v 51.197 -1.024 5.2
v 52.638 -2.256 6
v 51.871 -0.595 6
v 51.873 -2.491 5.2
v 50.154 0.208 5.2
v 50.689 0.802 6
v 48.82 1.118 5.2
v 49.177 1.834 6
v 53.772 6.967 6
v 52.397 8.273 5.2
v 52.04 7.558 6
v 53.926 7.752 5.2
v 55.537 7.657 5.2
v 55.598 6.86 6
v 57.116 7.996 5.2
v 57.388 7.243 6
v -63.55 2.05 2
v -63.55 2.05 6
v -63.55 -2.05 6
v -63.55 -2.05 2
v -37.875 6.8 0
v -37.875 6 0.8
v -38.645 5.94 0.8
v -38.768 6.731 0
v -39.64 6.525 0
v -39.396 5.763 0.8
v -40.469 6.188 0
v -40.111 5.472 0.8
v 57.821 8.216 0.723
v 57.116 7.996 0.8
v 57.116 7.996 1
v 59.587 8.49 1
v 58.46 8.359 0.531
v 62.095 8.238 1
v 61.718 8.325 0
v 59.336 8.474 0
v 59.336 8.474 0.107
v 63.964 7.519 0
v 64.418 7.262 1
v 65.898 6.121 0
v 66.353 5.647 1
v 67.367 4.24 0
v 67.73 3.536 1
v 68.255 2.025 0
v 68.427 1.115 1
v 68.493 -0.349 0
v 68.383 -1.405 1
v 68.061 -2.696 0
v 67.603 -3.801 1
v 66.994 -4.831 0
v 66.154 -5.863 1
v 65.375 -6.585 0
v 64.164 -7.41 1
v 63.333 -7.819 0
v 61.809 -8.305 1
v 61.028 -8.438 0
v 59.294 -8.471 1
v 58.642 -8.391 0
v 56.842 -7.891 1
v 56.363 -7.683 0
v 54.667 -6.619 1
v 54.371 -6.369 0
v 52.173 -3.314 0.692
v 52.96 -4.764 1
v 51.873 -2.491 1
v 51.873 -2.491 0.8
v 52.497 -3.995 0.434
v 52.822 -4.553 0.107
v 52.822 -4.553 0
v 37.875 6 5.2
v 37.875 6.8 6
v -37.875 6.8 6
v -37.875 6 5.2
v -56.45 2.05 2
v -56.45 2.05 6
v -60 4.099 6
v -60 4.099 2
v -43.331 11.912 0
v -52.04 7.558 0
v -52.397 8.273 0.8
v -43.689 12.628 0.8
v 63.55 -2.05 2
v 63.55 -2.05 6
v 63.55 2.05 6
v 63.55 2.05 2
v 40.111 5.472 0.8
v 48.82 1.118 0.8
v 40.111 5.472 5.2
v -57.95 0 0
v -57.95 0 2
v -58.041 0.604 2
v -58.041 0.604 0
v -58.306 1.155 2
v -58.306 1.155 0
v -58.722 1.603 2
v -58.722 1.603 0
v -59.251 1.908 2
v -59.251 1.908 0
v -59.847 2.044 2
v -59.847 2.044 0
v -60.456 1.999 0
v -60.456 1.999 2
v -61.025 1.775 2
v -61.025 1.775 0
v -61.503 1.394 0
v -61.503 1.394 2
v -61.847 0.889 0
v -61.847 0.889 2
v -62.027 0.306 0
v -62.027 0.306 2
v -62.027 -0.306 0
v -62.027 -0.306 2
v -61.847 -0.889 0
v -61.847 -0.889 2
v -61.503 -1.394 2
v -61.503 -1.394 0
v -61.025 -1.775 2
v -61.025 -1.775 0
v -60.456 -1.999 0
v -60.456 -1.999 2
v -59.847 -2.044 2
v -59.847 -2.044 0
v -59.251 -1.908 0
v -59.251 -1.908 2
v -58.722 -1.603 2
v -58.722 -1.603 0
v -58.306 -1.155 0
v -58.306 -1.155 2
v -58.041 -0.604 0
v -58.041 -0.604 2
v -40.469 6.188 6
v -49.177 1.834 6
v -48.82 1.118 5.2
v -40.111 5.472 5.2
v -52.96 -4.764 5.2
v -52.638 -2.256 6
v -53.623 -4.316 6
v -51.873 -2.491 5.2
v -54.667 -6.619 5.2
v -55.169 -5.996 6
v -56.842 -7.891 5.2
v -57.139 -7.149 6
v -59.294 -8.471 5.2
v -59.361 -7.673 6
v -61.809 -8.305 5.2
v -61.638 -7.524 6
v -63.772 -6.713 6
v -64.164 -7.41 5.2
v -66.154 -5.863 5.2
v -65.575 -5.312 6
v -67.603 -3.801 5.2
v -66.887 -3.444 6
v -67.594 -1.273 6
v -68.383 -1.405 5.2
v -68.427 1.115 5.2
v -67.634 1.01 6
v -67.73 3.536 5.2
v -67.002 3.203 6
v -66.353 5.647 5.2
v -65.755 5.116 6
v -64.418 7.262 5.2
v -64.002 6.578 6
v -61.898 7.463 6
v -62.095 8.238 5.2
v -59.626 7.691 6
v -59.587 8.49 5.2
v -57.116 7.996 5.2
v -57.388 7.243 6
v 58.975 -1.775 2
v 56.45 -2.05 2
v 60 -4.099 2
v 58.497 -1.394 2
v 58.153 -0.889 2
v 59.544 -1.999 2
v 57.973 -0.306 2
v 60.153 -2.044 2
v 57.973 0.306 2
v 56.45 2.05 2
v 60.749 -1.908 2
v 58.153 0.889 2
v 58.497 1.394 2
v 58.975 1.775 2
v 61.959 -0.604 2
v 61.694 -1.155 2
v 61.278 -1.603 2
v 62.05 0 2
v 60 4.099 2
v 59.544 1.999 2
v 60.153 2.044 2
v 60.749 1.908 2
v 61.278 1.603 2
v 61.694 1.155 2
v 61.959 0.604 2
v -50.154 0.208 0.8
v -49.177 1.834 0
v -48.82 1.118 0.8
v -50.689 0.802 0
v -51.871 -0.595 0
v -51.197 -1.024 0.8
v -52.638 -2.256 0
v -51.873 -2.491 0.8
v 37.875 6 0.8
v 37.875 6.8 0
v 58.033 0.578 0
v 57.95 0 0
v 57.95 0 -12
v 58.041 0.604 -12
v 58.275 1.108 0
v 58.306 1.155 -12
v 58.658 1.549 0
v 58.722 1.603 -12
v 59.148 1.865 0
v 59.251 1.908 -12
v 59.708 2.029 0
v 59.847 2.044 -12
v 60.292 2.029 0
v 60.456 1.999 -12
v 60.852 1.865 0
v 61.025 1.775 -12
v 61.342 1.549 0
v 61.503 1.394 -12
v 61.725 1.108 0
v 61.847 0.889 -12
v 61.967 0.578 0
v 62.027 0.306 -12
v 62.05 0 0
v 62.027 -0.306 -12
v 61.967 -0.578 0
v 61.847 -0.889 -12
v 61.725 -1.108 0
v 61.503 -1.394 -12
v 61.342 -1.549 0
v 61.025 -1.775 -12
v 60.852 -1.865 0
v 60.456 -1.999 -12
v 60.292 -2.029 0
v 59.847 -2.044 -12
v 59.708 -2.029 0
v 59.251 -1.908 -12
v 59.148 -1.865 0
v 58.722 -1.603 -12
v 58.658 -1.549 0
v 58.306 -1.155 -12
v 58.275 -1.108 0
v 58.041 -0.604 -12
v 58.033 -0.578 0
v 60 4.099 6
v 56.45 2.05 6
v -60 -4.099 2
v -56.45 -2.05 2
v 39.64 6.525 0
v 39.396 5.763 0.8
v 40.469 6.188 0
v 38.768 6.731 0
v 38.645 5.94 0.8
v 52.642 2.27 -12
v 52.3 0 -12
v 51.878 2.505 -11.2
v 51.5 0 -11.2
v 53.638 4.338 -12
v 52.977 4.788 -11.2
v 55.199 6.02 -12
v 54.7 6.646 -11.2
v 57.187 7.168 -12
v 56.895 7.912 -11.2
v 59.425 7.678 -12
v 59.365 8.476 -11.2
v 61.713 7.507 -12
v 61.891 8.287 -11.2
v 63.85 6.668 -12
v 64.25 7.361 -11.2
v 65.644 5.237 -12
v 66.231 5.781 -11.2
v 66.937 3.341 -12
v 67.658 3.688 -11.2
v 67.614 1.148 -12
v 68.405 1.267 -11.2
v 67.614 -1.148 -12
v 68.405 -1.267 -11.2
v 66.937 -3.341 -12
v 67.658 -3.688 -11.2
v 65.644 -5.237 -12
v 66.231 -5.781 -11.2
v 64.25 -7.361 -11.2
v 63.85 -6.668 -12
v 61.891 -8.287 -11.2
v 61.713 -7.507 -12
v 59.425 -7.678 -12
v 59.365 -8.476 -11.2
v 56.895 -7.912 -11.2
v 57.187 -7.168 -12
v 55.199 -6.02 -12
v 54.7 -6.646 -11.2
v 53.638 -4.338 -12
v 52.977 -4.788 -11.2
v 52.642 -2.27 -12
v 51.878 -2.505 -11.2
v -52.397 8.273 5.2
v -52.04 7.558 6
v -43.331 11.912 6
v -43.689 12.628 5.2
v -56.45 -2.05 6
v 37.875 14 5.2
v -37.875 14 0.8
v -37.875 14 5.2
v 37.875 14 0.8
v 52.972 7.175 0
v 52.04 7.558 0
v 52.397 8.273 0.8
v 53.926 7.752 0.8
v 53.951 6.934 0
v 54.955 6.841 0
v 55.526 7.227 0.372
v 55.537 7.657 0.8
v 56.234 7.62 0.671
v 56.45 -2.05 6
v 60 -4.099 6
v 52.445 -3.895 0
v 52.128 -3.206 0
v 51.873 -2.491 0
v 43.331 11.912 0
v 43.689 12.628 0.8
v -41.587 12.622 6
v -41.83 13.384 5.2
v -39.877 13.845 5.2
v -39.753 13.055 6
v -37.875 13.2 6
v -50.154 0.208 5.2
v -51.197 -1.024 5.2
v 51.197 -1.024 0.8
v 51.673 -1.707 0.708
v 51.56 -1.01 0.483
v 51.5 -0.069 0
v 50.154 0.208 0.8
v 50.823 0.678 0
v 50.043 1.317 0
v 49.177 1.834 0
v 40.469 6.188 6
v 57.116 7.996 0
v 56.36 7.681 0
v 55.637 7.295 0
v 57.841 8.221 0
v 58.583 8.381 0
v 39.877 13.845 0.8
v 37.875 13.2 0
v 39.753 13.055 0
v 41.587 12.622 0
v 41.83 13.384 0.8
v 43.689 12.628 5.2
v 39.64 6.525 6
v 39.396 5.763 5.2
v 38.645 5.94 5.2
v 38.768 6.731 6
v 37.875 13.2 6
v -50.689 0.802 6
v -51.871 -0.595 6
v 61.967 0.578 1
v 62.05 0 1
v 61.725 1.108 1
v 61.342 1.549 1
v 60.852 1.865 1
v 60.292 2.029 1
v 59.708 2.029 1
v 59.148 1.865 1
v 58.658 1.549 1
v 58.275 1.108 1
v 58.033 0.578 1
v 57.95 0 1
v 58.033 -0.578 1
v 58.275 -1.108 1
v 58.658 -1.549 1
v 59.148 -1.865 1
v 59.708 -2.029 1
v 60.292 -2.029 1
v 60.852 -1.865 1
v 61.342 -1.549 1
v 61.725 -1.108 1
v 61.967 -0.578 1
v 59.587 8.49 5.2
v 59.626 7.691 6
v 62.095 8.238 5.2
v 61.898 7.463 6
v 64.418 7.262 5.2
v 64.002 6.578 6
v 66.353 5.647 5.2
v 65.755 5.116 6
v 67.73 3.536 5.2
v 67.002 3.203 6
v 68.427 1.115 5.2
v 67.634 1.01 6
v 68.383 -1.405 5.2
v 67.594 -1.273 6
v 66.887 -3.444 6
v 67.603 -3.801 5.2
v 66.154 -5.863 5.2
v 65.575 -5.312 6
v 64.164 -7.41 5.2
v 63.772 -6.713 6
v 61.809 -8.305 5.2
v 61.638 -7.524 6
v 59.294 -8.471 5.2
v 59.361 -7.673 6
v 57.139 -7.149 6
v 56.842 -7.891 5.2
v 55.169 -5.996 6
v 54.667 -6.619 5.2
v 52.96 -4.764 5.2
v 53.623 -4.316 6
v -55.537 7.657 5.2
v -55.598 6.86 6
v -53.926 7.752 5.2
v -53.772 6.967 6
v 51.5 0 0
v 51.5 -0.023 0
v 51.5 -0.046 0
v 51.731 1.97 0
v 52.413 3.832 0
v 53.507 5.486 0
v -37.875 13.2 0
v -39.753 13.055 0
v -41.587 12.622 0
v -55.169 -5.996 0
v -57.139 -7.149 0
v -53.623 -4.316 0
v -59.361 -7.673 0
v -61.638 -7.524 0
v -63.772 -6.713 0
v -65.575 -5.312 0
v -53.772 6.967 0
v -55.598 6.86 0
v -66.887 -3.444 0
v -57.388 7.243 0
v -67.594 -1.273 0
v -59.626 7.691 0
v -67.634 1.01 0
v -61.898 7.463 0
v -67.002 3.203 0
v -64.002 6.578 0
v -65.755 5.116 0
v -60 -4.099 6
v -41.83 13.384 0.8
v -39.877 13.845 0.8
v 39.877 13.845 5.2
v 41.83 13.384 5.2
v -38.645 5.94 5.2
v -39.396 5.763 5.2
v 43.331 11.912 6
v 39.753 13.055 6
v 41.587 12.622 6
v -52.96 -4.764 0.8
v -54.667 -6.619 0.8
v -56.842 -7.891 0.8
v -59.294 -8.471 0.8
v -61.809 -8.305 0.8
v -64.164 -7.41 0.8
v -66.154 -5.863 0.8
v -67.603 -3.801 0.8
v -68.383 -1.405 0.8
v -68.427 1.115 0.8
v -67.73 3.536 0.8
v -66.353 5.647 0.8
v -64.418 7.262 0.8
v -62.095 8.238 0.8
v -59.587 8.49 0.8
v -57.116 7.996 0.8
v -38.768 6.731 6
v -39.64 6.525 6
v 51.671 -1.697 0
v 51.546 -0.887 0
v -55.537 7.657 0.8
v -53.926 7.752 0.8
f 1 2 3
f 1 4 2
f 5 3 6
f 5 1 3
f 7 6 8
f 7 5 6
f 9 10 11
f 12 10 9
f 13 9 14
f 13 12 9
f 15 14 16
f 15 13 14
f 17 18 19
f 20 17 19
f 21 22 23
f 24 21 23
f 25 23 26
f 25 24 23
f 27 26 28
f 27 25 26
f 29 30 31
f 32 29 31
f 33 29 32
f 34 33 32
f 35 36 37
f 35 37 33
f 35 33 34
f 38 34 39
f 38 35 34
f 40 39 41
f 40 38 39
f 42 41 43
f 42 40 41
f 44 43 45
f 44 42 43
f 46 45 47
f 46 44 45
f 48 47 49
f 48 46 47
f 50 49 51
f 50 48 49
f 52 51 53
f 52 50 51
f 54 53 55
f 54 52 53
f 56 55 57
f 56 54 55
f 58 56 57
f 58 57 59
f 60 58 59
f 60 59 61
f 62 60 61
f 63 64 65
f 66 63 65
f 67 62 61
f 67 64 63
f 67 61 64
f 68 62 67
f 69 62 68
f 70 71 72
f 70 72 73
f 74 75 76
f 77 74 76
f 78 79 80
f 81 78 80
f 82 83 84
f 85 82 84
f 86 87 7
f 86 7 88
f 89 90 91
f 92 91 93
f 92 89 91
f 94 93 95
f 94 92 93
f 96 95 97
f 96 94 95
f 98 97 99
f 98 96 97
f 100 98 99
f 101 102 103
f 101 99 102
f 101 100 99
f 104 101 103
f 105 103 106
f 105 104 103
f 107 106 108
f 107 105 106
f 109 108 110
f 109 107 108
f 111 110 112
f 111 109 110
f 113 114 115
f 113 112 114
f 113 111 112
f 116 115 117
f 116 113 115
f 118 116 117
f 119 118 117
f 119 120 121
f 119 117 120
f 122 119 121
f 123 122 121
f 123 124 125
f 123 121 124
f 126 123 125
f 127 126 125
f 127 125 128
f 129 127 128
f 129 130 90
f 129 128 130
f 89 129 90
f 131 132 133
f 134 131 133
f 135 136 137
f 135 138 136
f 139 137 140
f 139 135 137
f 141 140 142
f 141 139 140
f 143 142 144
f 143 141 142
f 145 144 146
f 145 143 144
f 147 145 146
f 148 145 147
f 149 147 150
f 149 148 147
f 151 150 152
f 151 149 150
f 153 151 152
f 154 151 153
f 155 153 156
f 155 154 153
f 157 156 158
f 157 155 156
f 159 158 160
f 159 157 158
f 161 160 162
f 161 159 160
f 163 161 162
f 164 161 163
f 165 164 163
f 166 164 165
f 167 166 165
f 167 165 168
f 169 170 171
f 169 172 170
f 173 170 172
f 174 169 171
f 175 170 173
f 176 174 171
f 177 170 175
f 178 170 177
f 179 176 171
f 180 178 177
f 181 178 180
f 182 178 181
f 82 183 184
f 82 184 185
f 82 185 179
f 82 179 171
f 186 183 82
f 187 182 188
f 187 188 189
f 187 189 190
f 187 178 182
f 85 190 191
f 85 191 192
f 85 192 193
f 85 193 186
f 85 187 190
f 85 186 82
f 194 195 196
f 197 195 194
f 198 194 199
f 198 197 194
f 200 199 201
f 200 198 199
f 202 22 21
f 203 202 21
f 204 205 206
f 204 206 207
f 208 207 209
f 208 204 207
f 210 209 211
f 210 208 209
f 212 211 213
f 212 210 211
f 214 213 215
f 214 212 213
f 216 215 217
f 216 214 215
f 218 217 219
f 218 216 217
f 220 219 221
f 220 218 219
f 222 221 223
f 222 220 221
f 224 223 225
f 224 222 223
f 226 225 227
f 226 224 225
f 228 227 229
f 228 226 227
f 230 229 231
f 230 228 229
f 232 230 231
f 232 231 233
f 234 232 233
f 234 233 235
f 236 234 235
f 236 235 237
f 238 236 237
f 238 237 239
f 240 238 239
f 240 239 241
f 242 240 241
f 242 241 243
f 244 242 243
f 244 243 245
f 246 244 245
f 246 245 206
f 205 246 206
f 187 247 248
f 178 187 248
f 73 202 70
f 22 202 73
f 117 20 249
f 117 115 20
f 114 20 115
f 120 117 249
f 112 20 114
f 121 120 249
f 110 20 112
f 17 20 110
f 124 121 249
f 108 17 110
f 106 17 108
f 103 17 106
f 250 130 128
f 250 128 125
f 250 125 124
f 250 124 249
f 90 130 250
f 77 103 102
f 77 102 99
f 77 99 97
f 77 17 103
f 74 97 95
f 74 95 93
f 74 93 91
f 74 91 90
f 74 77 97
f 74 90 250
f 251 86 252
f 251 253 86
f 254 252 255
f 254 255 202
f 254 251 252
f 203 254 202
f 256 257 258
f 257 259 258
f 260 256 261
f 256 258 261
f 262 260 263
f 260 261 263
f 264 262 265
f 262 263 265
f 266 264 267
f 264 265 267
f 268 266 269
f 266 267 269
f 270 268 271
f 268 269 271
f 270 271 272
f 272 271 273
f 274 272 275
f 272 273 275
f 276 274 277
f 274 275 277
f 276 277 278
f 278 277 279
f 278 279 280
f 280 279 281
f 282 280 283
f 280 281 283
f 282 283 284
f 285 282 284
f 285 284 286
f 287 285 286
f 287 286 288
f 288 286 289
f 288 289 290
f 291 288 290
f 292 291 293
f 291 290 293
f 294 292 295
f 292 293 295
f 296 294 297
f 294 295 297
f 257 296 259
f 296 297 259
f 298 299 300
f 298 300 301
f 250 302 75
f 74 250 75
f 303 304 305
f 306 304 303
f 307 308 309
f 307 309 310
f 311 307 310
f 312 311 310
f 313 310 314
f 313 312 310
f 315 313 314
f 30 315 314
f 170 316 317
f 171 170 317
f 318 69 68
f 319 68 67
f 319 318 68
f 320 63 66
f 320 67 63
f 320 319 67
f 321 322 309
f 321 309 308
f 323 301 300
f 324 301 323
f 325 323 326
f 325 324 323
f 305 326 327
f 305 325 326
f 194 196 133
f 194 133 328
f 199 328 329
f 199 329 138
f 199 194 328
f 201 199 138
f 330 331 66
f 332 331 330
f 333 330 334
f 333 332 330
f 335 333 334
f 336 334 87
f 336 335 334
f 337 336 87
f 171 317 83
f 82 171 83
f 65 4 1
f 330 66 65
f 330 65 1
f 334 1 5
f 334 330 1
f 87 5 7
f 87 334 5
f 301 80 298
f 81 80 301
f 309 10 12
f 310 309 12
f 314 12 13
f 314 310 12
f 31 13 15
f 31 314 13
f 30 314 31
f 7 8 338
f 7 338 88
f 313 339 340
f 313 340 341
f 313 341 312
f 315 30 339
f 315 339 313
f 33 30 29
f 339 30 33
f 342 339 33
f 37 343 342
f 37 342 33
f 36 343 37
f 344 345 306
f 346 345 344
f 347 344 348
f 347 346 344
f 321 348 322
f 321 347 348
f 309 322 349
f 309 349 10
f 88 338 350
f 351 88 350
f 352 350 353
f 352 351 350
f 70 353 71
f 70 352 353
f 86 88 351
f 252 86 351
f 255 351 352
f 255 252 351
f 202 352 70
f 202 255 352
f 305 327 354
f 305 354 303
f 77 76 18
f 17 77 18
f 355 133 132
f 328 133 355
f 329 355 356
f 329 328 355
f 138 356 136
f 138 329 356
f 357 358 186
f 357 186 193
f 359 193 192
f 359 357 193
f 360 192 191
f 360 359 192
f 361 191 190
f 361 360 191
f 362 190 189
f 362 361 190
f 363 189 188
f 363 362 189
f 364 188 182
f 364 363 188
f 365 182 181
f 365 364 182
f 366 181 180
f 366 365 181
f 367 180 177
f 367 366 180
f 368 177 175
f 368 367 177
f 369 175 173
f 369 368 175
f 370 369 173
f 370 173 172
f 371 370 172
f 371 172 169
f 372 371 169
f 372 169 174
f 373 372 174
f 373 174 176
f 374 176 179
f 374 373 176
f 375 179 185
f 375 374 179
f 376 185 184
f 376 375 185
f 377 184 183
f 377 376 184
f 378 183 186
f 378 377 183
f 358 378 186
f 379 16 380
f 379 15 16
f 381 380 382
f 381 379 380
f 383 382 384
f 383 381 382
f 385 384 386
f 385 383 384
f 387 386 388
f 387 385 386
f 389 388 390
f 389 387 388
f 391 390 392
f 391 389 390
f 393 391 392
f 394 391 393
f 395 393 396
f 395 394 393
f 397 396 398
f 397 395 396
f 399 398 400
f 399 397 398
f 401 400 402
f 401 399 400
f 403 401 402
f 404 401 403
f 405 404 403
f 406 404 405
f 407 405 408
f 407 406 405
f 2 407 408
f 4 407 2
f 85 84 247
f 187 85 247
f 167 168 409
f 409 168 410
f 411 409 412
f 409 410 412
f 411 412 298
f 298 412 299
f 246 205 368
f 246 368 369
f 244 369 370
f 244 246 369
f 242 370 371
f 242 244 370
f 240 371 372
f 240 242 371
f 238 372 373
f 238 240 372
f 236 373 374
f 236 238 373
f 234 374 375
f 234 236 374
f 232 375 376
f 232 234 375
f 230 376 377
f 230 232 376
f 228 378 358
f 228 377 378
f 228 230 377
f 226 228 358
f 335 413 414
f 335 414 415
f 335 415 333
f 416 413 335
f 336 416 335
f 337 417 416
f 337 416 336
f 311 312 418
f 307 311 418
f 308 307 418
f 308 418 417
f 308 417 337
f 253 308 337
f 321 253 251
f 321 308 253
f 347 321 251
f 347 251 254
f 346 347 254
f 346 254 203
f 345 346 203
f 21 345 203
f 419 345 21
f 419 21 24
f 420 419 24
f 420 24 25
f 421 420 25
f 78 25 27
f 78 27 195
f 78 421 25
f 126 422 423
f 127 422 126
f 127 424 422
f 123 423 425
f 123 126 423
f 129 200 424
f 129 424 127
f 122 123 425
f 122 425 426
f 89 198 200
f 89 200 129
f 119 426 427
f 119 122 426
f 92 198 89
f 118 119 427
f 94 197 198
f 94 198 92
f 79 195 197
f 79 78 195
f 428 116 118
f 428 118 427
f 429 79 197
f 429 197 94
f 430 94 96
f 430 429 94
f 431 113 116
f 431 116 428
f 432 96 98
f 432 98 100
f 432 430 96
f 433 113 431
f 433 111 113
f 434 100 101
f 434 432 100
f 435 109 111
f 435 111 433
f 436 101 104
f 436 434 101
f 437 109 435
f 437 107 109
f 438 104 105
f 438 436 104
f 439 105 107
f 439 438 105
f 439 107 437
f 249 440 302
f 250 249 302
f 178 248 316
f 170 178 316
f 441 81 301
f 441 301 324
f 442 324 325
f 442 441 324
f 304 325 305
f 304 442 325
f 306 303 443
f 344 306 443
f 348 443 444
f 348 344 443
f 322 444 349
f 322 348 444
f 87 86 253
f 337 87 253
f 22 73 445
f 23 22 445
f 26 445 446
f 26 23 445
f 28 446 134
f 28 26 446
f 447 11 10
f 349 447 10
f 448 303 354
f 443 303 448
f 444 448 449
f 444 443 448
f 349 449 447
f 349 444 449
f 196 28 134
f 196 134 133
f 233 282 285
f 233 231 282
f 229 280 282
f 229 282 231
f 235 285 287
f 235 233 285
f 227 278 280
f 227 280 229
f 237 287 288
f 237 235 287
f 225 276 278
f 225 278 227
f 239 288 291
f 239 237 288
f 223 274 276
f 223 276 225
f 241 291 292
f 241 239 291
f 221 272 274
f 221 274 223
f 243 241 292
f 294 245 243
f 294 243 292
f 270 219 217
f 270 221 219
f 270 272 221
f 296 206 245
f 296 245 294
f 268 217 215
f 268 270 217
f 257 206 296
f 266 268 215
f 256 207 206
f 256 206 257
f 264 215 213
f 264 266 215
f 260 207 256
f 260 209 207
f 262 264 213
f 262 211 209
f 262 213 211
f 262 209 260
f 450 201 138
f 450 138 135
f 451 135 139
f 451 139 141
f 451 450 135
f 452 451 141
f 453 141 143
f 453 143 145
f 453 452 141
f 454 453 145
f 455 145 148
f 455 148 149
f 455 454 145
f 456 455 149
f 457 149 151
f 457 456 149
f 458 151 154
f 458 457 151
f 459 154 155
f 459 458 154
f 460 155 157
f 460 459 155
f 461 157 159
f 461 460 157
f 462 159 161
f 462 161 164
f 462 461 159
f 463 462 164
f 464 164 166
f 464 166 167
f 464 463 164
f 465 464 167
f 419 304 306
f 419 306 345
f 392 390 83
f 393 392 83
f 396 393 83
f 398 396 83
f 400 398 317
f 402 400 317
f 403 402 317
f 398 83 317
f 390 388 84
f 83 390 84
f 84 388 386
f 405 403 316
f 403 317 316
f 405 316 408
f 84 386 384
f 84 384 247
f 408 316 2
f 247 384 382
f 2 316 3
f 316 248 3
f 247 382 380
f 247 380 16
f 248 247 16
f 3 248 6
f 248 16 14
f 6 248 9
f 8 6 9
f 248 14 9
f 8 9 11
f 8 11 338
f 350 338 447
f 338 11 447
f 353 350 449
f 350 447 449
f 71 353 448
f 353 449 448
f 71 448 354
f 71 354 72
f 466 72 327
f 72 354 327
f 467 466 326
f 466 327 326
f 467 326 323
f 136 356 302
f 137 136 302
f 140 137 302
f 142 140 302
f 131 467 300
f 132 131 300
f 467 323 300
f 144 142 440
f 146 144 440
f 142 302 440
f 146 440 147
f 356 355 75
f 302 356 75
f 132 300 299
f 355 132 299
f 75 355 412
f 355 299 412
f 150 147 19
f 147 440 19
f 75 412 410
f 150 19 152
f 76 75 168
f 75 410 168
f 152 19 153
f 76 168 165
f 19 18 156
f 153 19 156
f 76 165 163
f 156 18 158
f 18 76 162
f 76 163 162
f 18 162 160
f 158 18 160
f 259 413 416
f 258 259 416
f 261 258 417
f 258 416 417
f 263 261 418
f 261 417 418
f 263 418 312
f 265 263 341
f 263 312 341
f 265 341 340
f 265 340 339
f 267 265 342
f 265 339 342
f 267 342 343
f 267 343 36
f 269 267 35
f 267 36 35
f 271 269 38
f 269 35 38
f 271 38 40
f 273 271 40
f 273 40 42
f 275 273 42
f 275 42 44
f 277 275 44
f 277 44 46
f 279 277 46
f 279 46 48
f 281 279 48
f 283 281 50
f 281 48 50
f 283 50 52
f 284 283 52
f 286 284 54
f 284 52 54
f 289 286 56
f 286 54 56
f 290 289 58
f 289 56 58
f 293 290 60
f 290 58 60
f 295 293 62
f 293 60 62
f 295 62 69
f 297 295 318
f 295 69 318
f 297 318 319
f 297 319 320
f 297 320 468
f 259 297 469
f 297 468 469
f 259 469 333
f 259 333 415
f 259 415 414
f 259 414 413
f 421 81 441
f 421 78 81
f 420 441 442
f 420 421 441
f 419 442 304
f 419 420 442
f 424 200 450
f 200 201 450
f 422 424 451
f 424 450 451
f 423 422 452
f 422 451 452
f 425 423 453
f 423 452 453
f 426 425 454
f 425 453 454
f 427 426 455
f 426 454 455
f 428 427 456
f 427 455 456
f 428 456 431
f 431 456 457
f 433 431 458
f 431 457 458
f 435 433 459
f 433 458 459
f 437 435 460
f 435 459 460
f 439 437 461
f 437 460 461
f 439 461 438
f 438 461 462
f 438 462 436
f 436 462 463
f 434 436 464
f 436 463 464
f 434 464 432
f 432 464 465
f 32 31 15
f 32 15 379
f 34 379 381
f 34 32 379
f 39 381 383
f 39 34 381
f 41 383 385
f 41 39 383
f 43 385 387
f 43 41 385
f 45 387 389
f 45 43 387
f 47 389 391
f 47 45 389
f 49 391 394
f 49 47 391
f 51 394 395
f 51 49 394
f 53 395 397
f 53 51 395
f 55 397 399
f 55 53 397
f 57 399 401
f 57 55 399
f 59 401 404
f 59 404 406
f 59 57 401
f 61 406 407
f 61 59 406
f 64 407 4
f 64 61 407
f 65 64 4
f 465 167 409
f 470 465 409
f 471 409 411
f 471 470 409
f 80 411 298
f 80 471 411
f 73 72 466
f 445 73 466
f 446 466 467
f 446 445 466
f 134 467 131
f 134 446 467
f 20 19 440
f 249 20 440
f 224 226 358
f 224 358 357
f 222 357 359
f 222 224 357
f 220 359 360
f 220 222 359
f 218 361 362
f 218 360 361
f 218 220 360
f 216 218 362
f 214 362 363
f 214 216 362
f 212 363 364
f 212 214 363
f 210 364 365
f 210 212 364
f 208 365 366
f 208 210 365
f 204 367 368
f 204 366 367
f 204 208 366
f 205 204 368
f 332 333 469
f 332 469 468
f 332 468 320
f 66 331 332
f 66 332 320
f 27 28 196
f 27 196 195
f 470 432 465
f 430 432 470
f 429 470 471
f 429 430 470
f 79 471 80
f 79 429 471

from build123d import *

# Parameters (mm, degrees)
SKETCH1_R                = 2.05
BOSS_EXTRUDE1_DEPTH      = 6
CUT_EXTRUDE1_DEPTH       = 4
BOSS_EXTRUDE2_DEPTH      = 12
BOSS_EXTRUDE2_DEPTH_BACK = 1
SKETCH4_R                = 8.5
SKETCH4_R_2              = 2.05
CHAMFER3_SIZE            = 0.8


with BuildPart() as part:
    # Sketch1 → Boss-Extrude1 (new body)
    with BuildSketch(Plane.XY):
        with BuildLine():
            Line((-52.397368877, 8.273451517), (-43.689164944, 12.627553483))
            ThreePointArc((-43.689164944, 12.627553483), (-40.86217617, 13.652236863), (-37.875388203, 14))
            Line((-37.875388203, 14), (37.875388203, 14))
            ThreePointArc((37.875388203, 14), (40.86217617, 13.652236863), (43.689164944, 12.627553483))
            Line((43.689164944, 12.627553483), (52.397368877, 8.273451517))
            ThreePointArc((52.397368877, 8.273451517), (54.728318318, 7.650368424), (57.116243367, 7.995870664))
            ThreePointArc((57.116243367, 7.995870664), (67.602631123, -3.801315562), (51.873049489, -2.490517092))
            ThreePointArc((51.873049489, -2.490517092), (50.716696252, -0.372875708), (48.819660113, 1.118033989))
            Line((48.819660113, 1.118033989), (40.11145618, 5.472135955))
            ThreePointArc((40.11145618, 5.472135955), (39.024152805, 5.866244947), (37.875388203, 6))
            Line((37.875388203, 6), (-37.875388203, 6))
            ThreePointArc((-37.875388203, 6), (-39.024152805, 5.866244947), (-40.11145618, 5.472135955))
            Line((-40.11145618, 5.472135955), (-48.819660113, 1.118033989))
            ThreePointArc((-48.819660113, 1.118033989), (-50.716696252, -0.372875708), (-51.873049489, -2.490517092))
            ThreePointArc((-51.873049489, -2.490517092), (-67.602631123, -3.801315562), (-57.116243367, 7.995870664))
            ThreePointArc((-57.116243367, 7.995870664), (-54.728318318, 7.650368424), (-52.397368877, 8.273451517))
        make_face()
        with Locations((-60, 0)):
            Circle(SKETCH1_R, mode=Mode.SUBTRACT)
        with Locations((60, 0)):
            Circle(SKETCH1_R, mode=Mode.SUBTRACT)
    extrude(amount=BOSS_EXTRUDE1_DEPTH)

    # Sketch3 → Cut-Extrude1 (cut)
    with BuildSketch(Plane.XY.offset(6)):
        Polygon((-60, 4.099186911), (-63.55, 2.049593456), (-63.55, -2.049593456), (-60, -4.099186911), (-56.45, -2.049593456), (-56.45, 2.049593456), align=None)
        Polygon((60, 4.099186911), (56.45, 2.049593456), (56.45, -2.049593456), (60, -4.099186911), (63.55, -2.049593456), (63.55, 2.049593456), align=None)
    extrude(amount=-CUT_EXTRUDE1_DEPTH, mode=Mode.SUBTRACT)

    # Sketch4 → Boss-Extrude2 (add, two sides: drawn at the far end of the back side and taken through both)
    with BuildSketch(Plane(origin=(0, 0, 0), x_dir=(-1, 0, 0), z_dir=(0, 0, -1)).offset(-BOSS_EXTRUDE2_DEPTH_BACK)):
        with Locations((-60, 0)):
            Circle(SKETCH4_R)
        with Locations((-60, 0)):
            Circle(SKETCH4_R_2, mode=Mode.SUBTRACT)
    extrude(amount=BOSS_EXTRUDE2_DEPTH + BOSS_EXTRUDE2_DEPTH_BACK)

    # Chamfer3
    # the kernel refuses this chamfer: 0.8 mm, written as the material it adds along each edge
    # the kernel refuses this chamfer: 0.8 mm, written as the material it takes off along each edge
    with BuildSketch(Plane(origin=(37.875388203, 1, 0), x_dir=(0.44721359549995965, 0.894427190999915, 0), z_dir=(0.894427190999915, -0.44721359549995965, 0))) as chamfer3_2_piece_1:
        Polygon((5, CHAMFER3_SIZE), (5 + CHAMFER3_SIZE, 0), (5, 0), align=None)
    revolve(axis=Axis((37.875388203, 1, 0), (0, 0, 1)), revolution_arc=26.565051177, mode=Mode.SUBTRACT)
    with BuildSketch(Plane(origin=(48.819660113, 1.118033989, 0), x_dir=(-0.012296529840444168, -0.024593059680888388, 0.9996219169112966), z_dir=(-0.8944271909999163, 0.44721359549995715, 0)), Plane(origin=(-40.11145618, 5.472135955, 0), x_dir=(0.01229652984044405, -0.02459305968088818, 0.9996219169112966), z_dir=(-0.8944271909999165, -0.4472135954999568, 0)), Plane(origin=(43.689164944, 12.627553483, 0), x_dir=(0.012296529840444093, 0.02459305968088816, 0.9996219169112966), z_dir=(0.8944271909999156, -0.44721359549995837, 0)), Plane(origin=(48.819660113, 1.118033989, 6), x_dir=(0.4470445116024604, 0.8940890232049228, 0.02749587661058619), z_dir=(-0.8944271909999163, 0.44721359549995715, 0)), Plane(origin=(-40.11145618, 5.472135955, 6), x_dir=(-0.4470445116024601, 0.8940890232049231, 0.02749587661058619), z_dir=(-0.8944271909999165, -0.4472135954999568, 0)), Plane(origin=(43.689164944, 12.627553483, 6), x_dir=(-0.4470445116024617, -0.8940890232049222, 0.027495876610586216), z_dir=(0.8944271909999156, -0.44721359549995837, 0)), Plane(origin=(-52.397368877, 8.273451517, 6), x_dir=(0.44704451160246106, -0.8940890232049225, 0.027495876610586212), z_dir=(0.894427190999916, 0.4472135954999578, 0))) as chamfer3_2_piece_2:
        Polygon((CHAMFER3_SIZE * 0.999621916911, CHAMFER3_SIZE * 0.0274958766106), (-CHAMFER3_SIZE * 0.0274958766106, CHAMFER3_SIZE * 0.999621916911), (0, 0), align=None)
    extrude(amount=9.736067977, mode=Mode.SUBTRACT)
    with BuildSketch(Plane(origin=(37.875388203, 6, 0), x_dir=(0, -0.027495876610586275, 0.9996219169112968), z_dir=(-1, 0, 0)), Plane(origin=(-37.875388203, 14, 0), x_dir=(0, 0.02749587661058735, 0.9996219169112966), z_dir=(1, 0, 0)), Plane(origin=(37.875388203, 6, 6), x_dir=(0, 0.9996219169112968, 0.027495876610586285), z_dir=(-1, 0, 0)), Plane(origin=(-37.875388203, 14, 6), x_dir=(0, -0.9996219169112968, 0.027495876610586226), z_dir=(1, 0, 0))) as chamfer3_2_piece_3:
        Polygon((CHAMFER3_SIZE * 0.999621916911, CHAMFER3_SIZE * 0.0274958766106), (-CHAMFER3_SIZE * 0.0274958766106, CHAMFER3_SIZE * 0.999621916911), (0, 0), align=None)
    extrude(amount=75.750776405, mode=Mode.SUBTRACT)
    with BuildSketch(Plane(origin=(46.13637854, -4.248529157, 0), x_dir=(0.9989622079668251, -0.04554675678954209, 0), z_dir=(-0.04554675678954209, -0.9989622079668251, 0))) as chamfer3_2_piece_4_section:
        Polygon((6, CHAMFER3_SIZE), (6 + CHAMFER3_SIZE, 0), (6, 0), align=None)
    chamfer3_2_piece_4 = revolve(axis=Axis((46.13637854, -4.248529157, 0), (0, 0, 1)), revolution_arc=66.045488886, mode=Mode.PRIVATE)
    chamfer3_2_piece_4 = chamfer3_2_piece_4 - Plane(origin=(60, 0, 0.316419024), x_dir=(-1, 0, 0), z_dir=(0, 0, 1)) * Cylinder(8.5, 28, mode=Mode.PRIVATE)
    add(chamfer3_2_piece_4, mode=Mode.SUBTRACT)
    with BuildSketch(Plane(origin=(-37.875388203, 1, 0), x_dir=(0, 1, 0), z_dir=(1, 0, 0))) as chamfer3_2_piece_5:
        Polygon((5, CHAMFER3_SIZE), (5 + CHAMFER3_SIZE, 0), (5, 0), align=None)
    revolve(axis=Axis((-37.875388203, 1, 0), (0, 0, 1)), revolution_arc=26.565051177, mode=Mode.SUBTRACT)
    with BuildSketch(Plane(origin=(55.08065045, 13.640014663, 0), x_dir=(-0.44721359549995726, -0.8944271909999163, 0), z_dir=(-0.8944271909999163, 0.44721359549995726, 0))) as chamfer3_2_piece_6_section:
        Polygon((6, CHAMFER3_SIZE), (6 + CHAMFER3_SIZE, 0), (6, 0), align=None)
    chamfer3_2_piece_6 = revolve(axis=Axis((55.08065045, 13.640014663, 0), (0, 0, 1)), revolution_arc=66.045488886, mode=Mode.PRIVATE)
    chamfer3_2_piece_6 = chamfer3_2_piece_6 - Plane(origin=(60, 0, 0.316418933), x_dir=(-1, 0, 0), z_dir=(0, 0, 1)) * Cylinder(8.5, 28, mode=Mode.PRIVATE)
    add(chamfer3_2_piece_6, mode=Mode.SUBTRACT)
    with BuildSketch(Plane(origin=(-46.13637854, -4.248529157, 0), x_dir=(-0.4472135954999641, 0.8944271909999129, 0), z_dir=(0.8944271909999129, 0.4472135954999641, 0))) as chamfer3_2_piece_7:
        Polygon((6, CHAMFER3_SIZE), (6 + CHAMFER3_SIZE, 0), (6, 0), align=None)
    revolve(axis=Axis((-46.13637854, -4.248529157, 0), (0, 0, 1)), revolution_arc=46.397181027, mode=Mode.SUBTRACT)
    with BuildSketch(Plane(origin=(-60, 0, 0), x_dir=(0.9561118248619797, -0.29300201084479827, 0), z_dir=(0.29300201084479827, 0.9561118248619797, 0))) as chamfer3_2_piece_8:
        Polygon((8.5 - CHAMFER3_SIZE, 0), (8.5, -CHAMFER3_SIZE), (8.5, 0), align=None)
    revolve(axis=Axis((-60, 0, 0), (0, 0, -1)), revolution_arc=272.794362055, mode=Mode.SUBTRACT)
    with BuildSketch(Plane(origin=(37.875388203, 1, 0), x_dir=(0, 1, 0), z_dir=(-1, 0, 0))) as chamfer3_2_piece_9:
        Polygon((13, -CHAMFER3_SIZE), (13 - CHAMFER3_SIZE, 0), (13, 0), align=None)
    revolve(axis=Axis((37.875388203, 1, 0), (0, 0, -1)), revolution_arc=26.565051177, mode=Mode.SUBTRACT)
    with BuildSketch(Plane(origin=(-55.08065045, 13.640014663, 0), x_dir=(-0.3392654862413453, -0.940690666396464, 0), z_dir=(-0.940690666396464, 0.3392654862413453, 0))) as chamfer3_2_piece_10:
        Polygon((6, CHAMFER3_SIZE), (6 + CHAMFER3_SIZE, 0), (6, 0), align=None)
    revolve(axis=Axis((-55.08065045, 13.640014663, 0), (0, 0, 1)), revolution_arc=46.397181027, mode=Mode.SUBTRACT)
    with BuildSketch(Plane(origin=(-52.397368877, 8.273451517, 0), x_dir=(0.44704451160246106, -0.8940890232049225, -0.027495876610586303), z_dir=(0.894427190999916, 0.4472135954999578, 0))) as chamfer3_2_piece_11:
        Polygon((CHAMFER3_SIZE * 0.999621916911, -CHAMFER3_SIZE * 0.0274958766106), (-CHAMFER3_SIZE * 0.0274958766106, -CHAMFER3_SIZE * 0.999621916911), (0, 0), align=None)
    extrude(amount=9.736067977, mode=Mode.SUBTRACT)
    with BuildSketch(Plane(origin=(-37.875388203, 1, 0), x_dir=(-0.4472135954999576, 0.894427190999916, 0), z_dir=(-0.894427190999916, -0.4472135954999576, 0))) as chamfer3_2_piece_12:
        Polygon((13, -CHAMFER3_SIZE), (13 - CHAMFER3_SIZE, 0), (13, 0), align=None)
    revolve(axis=Axis((-37.875388203, 1, 0), (0, 0, -1)), revolution_arc=26.565051177, mode=Mode.SUBTRACT)
    with BuildSketch(Plane(origin=(37.875388203, 1, 6), x_dir=(0.44721359549995965, 0.894427190999915, 0), z_dir=(0.894427190999915, -0.44721359549995965, 0))) as chamfer3_2_piece_13:
        Polygon((5 + CHAMFER3_SIZE, 0), (5, -CHAMFER3_SIZE), (5, 0), align=None)
    revolve(axis=Axis((37.875388203, 1, 6), (0, 0, 1)), revolution_arc=26.565051177, mode=Mode.SUBTRACT)
    with BuildSketch(Plane(origin=(46.13637854, -4.248529157, 6), x_dir=(0.956111824861979, 0.2930020108448003, 0), z_dir=(0.2930020108448003, -0.956111824861979, 0))) as chamfer3_2_piece_14:
        Polygon((6 + CHAMFER3_SIZE, 0), (6, -CHAMFER3_SIZE), (6, 0), align=None)
    revolve(axis=Axis((46.13637854, -4.248529157, 6), (0, 0, 1)), revolution_arc=46.397181027, mode=Mode.SUBTRACT)
    with BuildSketch(Plane(origin=(-37.875388203, 1, 6), x_dir=(0, 1, 0), z_dir=(1, 0, 0))) as chamfer3_2_piece_15:
        Polygon((5 + CHAMFER3_SIZE, 0), (5, -CHAMFER3_SIZE), (5, 0), align=None)
    revolve(axis=Axis((-37.875388203, 1, 6), (0, 0, 1)), revolution_arc=26.565051177, mode=Mode.SUBTRACT)
    with BuildSketch(Plane(origin=(60, 0, 6), x_dir=(-0.3392654862413484, 0.9406906663964629, 0), z_dir=(-0.9406906663964629, -0.3392654862413484, 0))) as chamfer3_2_piece_16:
        Polygon((8.5 - CHAMFER3_SIZE, 0), (8.5, CHAMFER3_SIZE), (8.5, 0), align=None)
    revolve(axis=Axis((60, 0, 6), (0, 0, -1)), revolution_arc=272.794362055, mode=Mode.SUBTRACT)
    with BuildSketch(Plane(origin=(55.08065045, 13.640014663, 6), x_dir=(-0.44721359549995726, -0.8944271909999163, 0), z_dir=(-0.8944271909999163, 0.44721359549995726, 0))) as chamfer3_2_piece_17:
        Polygon((6 + CHAMFER3_SIZE, 0), (6, -CHAMFER3_SIZE), (6, 0), align=None)
    revolve(axis=Axis((55.08065045, 13.640014663, 6), (0, 0, 1)), revolution_arc=46.397181027, mode=Mode.SUBTRACT)
    with BuildSketch(Plane(origin=(-46.13637854, -4.248529157, 6), x_dir=(-0.4472135954999641, 0.8944271909999129, 0), z_dir=(0.8944271909999129, 0.4472135954999641, 0))) as chamfer3_2_piece_18:
        Polygon((6 + CHAMFER3_SIZE, 0), (6, -CHAMFER3_SIZE), (6, 0), align=None)
    revolve(axis=Axis((-46.13637854, -4.248529157, 6), (0, 0, 1)), revolution_arc=46.397181027, mode=Mode.SUBTRACT)
    with BuildSketch(Plane(origin=(-60, 0, 6), x_dir=(0.9561118248619797, -0.29300201084479827, 0), z_dir=(0.29300201084479827, 0.9561118248619797, 0))) as chamfer3_2_piece_19:
        Polygon((8.5 - CHAMFER3_SIZE, 0), (8.5, CHAMFER3_SIZE), (8.5, 0), align=None)
    revolve(axis=Axis((-60, 0, 6), (0, 0, -1)), revolution_arc=272.794362055, mode=Mode.SUBTRACT)
    with BuildSketch(Plane(origin=(37.875388203, 1, 6), x_dir=(0, 1, 0), z_dir=(-1, 0, 0))) as chamfer3_2_piece_20:
        Polygon((13 - CHAMFER3_SIZE, 0), (13, CHAMFER3_SIZE), (13, 0), align=None)
    revolve(axis=Axis((37.875388203, 1, 6), (0, 0, -1)), revolution_arc=26.565051177, mode=Mode.SUBTRACT)
    with BuildSketch(Plane(origin=(-55.08065045, 13.640014663, 6), x_dir=(-0.3392654862413453, -0.940690666396464, 0), z_dir=(-0.940690666396464, 0.3392654862413453, 0))) as chamfer3_2_piece_21:
        Polygon((6, -CHAMFER3_SIZE), (6 + CHAMFER3_SIZE, 0), (6, 0), align=None)
    revolve(axis=Axis((-55.08065045, 13.640014663, 6), (0, 0, 1)), revolution_arc=46.397181027, mode=Mode.SUBTRACT)
    with BuildSketch(Plane(origin=(-37.875388203, 1, 6), x_dir=(-0.4472135954999576, 0.894427190999916, 0), z_dir=(-0.894427190999916, -0.4472135954999576, 0))) as chamfer3_2_piece_22:
        Polygon((13 - CHAMFER3_SIZE, 0), (13, CHAMFER3_SIZE), (13, 0), align=None)
    revolve(axis=Axis((-37.875388203, 1, 6), (0, 0, -1)), revolution_arc=26.565051177, mode=Mode.SUBTRACT)
    with BuildSketch(Plane(origin=(60, 0, -12), x_dir=(-1, 0, 0), z_dir=(0, -1, 0))) as chamfer3_2_piece_23:
        Polygon((8.5 - CHAMFER3_SIZE, 0), (8.5, -CHAMFER3_SIZE), (8.5, 0), align=None)
    revolve(axis=Axis((60, 0, -12), (0, 0, -1)), mode=Mode.SUBTRACT)


solid = part.part
